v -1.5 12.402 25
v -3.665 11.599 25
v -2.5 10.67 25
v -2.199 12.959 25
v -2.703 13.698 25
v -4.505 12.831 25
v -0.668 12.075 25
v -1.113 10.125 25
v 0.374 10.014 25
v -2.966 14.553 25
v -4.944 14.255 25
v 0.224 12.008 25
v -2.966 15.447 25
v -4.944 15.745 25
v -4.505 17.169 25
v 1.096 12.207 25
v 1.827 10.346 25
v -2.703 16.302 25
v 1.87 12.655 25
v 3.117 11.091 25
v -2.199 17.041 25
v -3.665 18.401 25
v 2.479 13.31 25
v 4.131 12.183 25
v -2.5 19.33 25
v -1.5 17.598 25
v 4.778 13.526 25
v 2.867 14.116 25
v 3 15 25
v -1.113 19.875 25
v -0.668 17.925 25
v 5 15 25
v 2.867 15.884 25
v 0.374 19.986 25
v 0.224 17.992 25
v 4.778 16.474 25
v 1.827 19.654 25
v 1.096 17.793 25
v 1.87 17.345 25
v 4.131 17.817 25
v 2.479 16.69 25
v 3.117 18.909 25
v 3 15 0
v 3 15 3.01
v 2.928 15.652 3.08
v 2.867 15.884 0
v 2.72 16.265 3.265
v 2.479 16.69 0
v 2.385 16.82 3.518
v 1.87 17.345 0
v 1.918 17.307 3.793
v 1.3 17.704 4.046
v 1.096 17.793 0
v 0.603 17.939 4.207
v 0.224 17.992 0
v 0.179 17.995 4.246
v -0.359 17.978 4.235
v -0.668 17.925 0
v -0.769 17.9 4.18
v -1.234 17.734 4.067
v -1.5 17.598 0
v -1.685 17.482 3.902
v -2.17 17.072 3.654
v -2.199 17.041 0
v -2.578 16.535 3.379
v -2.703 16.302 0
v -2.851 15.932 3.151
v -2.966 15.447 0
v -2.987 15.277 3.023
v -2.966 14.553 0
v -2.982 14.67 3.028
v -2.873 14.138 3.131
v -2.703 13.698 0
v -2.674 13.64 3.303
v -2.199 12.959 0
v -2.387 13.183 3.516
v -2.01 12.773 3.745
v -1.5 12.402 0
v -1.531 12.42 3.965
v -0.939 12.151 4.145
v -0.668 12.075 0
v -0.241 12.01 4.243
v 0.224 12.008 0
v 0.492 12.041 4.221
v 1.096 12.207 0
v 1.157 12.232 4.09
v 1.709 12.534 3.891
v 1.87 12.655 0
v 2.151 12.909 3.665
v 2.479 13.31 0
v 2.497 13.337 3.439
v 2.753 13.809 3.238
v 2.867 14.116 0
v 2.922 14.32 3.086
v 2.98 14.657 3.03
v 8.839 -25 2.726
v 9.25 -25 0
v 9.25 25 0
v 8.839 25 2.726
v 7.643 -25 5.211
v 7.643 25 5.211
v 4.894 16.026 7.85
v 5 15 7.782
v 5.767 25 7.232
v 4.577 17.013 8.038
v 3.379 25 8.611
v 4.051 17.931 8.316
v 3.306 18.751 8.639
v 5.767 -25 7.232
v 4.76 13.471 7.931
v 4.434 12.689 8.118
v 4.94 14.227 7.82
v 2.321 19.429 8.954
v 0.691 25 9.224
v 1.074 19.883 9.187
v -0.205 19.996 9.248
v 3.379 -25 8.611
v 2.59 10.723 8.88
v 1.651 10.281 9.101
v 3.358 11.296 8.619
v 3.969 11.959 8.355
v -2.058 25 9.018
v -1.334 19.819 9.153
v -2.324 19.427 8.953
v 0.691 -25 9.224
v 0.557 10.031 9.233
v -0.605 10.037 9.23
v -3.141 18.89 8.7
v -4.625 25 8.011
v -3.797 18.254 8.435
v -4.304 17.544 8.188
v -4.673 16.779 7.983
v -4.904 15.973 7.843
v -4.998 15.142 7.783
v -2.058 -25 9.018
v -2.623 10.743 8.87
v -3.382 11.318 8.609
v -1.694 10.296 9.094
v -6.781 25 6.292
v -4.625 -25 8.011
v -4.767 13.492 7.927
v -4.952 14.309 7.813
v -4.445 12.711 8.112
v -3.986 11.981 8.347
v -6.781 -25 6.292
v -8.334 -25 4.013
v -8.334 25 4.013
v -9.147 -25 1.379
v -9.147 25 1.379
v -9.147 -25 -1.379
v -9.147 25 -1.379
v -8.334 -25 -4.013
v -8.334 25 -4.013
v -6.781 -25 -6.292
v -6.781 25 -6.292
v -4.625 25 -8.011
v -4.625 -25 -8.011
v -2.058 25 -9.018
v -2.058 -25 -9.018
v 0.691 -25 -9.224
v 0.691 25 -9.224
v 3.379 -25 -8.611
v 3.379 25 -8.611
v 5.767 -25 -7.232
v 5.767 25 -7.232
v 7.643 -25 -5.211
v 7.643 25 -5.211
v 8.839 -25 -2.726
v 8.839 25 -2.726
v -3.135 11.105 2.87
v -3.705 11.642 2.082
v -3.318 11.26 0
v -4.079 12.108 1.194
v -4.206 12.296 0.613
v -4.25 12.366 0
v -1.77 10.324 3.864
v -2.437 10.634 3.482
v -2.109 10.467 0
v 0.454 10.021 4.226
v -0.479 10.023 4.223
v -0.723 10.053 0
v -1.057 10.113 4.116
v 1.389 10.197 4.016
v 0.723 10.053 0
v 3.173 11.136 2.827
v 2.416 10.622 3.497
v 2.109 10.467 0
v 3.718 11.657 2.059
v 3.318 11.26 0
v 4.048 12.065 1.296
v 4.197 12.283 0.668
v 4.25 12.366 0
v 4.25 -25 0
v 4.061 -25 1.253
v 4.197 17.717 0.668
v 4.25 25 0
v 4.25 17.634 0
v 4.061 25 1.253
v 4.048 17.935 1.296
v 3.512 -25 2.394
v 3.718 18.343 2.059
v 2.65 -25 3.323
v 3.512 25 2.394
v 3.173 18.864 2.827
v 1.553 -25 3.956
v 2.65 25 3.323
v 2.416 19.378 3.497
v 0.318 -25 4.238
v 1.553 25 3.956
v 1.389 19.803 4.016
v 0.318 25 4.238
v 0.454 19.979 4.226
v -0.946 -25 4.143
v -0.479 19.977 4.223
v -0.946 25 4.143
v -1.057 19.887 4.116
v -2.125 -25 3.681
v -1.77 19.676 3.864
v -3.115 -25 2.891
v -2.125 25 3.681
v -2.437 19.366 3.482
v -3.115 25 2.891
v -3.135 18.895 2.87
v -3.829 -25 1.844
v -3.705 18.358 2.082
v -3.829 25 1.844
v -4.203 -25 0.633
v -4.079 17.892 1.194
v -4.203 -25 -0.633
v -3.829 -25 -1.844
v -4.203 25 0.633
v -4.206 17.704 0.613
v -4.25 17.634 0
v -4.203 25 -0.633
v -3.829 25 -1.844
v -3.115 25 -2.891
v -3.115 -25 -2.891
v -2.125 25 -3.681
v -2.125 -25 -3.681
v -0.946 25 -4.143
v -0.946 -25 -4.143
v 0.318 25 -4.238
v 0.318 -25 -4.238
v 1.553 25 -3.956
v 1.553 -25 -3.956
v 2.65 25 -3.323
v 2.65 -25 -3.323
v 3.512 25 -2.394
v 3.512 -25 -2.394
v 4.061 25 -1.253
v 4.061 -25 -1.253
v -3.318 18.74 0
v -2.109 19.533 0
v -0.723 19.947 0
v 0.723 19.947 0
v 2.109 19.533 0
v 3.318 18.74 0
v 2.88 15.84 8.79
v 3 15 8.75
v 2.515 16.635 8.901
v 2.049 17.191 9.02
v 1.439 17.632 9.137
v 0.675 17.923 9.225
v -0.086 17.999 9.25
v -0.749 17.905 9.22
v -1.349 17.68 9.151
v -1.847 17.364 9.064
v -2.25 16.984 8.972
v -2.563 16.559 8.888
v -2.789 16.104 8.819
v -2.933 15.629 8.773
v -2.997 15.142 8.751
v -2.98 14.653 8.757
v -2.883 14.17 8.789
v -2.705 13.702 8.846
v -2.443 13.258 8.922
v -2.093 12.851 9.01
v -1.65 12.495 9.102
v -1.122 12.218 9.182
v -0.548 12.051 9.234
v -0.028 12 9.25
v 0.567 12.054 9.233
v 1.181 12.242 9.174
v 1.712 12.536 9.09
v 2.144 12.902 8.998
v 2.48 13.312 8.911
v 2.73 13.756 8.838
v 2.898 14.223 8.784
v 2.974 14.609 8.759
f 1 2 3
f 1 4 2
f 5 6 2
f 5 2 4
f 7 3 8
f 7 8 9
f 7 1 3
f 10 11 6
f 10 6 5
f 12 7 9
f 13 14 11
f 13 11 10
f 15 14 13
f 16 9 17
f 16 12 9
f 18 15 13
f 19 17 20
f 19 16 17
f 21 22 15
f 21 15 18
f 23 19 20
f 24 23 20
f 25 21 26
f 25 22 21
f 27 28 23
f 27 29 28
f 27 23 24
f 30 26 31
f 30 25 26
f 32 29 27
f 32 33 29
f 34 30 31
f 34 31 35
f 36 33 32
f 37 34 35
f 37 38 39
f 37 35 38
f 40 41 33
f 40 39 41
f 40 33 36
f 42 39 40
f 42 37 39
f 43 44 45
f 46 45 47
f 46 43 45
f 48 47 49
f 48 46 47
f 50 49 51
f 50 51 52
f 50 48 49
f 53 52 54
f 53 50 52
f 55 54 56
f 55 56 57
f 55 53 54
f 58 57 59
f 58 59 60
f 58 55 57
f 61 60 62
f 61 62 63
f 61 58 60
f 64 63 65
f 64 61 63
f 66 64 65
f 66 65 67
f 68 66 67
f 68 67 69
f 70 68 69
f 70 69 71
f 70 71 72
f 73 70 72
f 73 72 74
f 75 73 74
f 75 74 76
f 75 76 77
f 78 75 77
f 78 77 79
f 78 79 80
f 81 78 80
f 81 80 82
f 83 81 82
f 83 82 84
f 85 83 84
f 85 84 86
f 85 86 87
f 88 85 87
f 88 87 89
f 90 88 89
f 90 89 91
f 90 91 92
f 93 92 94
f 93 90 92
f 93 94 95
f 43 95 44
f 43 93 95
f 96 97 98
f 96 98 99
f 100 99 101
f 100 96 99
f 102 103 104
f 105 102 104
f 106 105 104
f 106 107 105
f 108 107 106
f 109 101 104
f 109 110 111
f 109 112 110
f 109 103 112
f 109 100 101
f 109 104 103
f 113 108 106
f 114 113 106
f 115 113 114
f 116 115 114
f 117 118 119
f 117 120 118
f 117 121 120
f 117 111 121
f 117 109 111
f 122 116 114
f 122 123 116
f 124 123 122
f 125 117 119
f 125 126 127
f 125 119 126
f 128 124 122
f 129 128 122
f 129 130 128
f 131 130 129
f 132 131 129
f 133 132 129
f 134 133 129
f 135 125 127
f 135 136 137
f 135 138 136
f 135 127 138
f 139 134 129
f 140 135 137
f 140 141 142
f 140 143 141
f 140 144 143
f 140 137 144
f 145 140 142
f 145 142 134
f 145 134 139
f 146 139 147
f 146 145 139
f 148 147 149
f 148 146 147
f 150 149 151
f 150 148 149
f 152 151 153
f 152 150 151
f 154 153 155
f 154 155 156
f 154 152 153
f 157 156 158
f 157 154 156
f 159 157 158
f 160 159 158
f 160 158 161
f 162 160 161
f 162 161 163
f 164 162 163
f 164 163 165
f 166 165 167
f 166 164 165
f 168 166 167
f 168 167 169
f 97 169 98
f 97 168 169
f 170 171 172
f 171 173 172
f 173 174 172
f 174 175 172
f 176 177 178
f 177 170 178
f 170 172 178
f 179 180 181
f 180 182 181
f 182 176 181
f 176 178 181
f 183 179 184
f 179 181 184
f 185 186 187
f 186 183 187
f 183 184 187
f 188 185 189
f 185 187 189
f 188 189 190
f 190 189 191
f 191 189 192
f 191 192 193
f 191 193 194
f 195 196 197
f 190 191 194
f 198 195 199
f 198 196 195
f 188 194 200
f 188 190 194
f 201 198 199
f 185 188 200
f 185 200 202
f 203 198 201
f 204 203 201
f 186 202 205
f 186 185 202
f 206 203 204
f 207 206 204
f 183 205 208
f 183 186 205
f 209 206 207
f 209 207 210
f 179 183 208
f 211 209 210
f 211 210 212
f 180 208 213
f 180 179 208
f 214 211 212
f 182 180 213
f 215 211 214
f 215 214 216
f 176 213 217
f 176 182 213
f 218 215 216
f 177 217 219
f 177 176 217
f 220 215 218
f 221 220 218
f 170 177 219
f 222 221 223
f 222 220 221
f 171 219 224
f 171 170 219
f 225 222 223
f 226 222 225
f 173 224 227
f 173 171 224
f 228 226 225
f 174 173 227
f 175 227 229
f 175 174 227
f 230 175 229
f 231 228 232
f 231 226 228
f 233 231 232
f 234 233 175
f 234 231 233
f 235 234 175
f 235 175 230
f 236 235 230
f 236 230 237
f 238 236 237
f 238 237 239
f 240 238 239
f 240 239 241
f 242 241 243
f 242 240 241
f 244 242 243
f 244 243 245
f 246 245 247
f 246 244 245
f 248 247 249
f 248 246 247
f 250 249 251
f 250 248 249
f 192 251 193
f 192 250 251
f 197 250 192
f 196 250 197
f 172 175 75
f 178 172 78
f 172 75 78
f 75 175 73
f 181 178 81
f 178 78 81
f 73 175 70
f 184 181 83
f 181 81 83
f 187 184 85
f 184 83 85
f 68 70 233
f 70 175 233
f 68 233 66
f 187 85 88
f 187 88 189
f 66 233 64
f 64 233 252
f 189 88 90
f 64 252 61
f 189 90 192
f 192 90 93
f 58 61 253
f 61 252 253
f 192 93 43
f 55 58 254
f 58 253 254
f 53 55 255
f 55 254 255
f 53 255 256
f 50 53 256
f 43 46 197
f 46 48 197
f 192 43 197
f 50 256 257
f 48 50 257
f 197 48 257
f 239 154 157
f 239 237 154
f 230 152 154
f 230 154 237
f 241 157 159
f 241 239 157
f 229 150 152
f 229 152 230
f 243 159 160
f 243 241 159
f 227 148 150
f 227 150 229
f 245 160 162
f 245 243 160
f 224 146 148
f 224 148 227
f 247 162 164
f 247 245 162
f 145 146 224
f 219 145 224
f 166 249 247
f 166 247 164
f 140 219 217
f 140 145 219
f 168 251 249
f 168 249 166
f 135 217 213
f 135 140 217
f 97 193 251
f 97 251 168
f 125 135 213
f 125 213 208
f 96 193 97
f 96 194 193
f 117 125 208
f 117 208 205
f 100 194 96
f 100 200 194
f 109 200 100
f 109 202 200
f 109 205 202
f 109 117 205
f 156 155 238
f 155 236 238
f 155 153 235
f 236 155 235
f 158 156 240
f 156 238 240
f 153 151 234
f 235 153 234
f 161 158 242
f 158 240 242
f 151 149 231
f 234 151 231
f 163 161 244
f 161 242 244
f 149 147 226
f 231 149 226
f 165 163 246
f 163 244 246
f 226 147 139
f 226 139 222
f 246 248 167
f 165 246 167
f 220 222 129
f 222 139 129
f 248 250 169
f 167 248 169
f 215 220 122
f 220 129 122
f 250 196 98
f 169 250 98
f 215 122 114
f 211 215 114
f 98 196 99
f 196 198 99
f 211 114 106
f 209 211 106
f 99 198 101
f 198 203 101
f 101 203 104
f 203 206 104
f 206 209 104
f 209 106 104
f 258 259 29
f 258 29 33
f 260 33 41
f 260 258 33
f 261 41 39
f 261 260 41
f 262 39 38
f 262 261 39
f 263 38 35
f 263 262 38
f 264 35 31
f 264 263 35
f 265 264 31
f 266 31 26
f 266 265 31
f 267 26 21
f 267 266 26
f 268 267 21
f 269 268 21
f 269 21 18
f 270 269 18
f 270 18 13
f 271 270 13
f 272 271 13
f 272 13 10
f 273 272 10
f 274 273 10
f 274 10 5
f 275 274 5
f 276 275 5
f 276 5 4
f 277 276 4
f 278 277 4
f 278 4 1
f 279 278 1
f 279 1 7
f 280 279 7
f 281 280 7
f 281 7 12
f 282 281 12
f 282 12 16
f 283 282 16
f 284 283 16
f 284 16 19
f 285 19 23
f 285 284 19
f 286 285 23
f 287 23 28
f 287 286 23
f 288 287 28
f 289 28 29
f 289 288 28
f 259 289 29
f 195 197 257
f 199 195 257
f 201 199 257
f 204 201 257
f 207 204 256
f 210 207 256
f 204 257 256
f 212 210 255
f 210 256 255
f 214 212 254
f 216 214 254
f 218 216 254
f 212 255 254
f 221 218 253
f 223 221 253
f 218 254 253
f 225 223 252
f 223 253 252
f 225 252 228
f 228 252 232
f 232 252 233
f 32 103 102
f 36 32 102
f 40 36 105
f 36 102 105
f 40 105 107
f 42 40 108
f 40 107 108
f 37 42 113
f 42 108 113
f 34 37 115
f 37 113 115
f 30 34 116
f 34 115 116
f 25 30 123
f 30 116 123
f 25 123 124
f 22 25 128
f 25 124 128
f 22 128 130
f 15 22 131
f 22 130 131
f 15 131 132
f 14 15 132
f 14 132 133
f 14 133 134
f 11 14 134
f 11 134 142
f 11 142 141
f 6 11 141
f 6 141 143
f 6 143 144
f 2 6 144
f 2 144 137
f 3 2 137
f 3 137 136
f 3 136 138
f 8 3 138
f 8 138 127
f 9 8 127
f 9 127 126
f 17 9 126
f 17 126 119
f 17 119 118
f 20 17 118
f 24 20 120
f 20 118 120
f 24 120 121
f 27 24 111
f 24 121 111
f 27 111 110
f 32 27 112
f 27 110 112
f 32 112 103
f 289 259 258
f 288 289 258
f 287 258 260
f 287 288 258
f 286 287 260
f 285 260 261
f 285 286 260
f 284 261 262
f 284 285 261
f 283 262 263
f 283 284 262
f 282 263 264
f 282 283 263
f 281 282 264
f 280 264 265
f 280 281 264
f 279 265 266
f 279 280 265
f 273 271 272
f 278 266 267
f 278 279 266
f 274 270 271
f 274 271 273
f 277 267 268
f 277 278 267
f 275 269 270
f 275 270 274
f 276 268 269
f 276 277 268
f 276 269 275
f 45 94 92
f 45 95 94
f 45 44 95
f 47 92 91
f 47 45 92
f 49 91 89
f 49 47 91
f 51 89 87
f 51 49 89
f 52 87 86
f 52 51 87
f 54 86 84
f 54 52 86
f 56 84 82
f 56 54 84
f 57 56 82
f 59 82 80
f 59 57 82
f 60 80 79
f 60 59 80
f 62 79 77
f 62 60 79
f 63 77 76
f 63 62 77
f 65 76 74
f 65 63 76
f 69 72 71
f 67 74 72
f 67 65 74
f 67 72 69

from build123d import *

# Parameters (mm, degrees)
F0_R     = 9.25
F0_R_2   = 4.25
F1_DEPTH = 25
F2_R     = 5
F2_R_2   = 3
F3_DEPTH = 25


with BuildPart() as f1:
    # F0 (on Front) → F1 (new body, symmetric)
    with BuildSketch(Plane.XZ):
        Circle(F0_R)
        Circle(F0_R_2, mode=Mode.SUBTRACT)
    extrude(amount=F1_DEPTH, both=True)

    # F2 (on Top) → F3 (join)
    with BuildSketch(Plane.XY):
        with Locations((0, 15)):
            Circle(F2_R)
        with Locations((0, 15)):
            Circle(F2_R_2, mode=Mode.SUBTRACT)
    extrude(amount=F3_DEPTH)


solid = f1.part
